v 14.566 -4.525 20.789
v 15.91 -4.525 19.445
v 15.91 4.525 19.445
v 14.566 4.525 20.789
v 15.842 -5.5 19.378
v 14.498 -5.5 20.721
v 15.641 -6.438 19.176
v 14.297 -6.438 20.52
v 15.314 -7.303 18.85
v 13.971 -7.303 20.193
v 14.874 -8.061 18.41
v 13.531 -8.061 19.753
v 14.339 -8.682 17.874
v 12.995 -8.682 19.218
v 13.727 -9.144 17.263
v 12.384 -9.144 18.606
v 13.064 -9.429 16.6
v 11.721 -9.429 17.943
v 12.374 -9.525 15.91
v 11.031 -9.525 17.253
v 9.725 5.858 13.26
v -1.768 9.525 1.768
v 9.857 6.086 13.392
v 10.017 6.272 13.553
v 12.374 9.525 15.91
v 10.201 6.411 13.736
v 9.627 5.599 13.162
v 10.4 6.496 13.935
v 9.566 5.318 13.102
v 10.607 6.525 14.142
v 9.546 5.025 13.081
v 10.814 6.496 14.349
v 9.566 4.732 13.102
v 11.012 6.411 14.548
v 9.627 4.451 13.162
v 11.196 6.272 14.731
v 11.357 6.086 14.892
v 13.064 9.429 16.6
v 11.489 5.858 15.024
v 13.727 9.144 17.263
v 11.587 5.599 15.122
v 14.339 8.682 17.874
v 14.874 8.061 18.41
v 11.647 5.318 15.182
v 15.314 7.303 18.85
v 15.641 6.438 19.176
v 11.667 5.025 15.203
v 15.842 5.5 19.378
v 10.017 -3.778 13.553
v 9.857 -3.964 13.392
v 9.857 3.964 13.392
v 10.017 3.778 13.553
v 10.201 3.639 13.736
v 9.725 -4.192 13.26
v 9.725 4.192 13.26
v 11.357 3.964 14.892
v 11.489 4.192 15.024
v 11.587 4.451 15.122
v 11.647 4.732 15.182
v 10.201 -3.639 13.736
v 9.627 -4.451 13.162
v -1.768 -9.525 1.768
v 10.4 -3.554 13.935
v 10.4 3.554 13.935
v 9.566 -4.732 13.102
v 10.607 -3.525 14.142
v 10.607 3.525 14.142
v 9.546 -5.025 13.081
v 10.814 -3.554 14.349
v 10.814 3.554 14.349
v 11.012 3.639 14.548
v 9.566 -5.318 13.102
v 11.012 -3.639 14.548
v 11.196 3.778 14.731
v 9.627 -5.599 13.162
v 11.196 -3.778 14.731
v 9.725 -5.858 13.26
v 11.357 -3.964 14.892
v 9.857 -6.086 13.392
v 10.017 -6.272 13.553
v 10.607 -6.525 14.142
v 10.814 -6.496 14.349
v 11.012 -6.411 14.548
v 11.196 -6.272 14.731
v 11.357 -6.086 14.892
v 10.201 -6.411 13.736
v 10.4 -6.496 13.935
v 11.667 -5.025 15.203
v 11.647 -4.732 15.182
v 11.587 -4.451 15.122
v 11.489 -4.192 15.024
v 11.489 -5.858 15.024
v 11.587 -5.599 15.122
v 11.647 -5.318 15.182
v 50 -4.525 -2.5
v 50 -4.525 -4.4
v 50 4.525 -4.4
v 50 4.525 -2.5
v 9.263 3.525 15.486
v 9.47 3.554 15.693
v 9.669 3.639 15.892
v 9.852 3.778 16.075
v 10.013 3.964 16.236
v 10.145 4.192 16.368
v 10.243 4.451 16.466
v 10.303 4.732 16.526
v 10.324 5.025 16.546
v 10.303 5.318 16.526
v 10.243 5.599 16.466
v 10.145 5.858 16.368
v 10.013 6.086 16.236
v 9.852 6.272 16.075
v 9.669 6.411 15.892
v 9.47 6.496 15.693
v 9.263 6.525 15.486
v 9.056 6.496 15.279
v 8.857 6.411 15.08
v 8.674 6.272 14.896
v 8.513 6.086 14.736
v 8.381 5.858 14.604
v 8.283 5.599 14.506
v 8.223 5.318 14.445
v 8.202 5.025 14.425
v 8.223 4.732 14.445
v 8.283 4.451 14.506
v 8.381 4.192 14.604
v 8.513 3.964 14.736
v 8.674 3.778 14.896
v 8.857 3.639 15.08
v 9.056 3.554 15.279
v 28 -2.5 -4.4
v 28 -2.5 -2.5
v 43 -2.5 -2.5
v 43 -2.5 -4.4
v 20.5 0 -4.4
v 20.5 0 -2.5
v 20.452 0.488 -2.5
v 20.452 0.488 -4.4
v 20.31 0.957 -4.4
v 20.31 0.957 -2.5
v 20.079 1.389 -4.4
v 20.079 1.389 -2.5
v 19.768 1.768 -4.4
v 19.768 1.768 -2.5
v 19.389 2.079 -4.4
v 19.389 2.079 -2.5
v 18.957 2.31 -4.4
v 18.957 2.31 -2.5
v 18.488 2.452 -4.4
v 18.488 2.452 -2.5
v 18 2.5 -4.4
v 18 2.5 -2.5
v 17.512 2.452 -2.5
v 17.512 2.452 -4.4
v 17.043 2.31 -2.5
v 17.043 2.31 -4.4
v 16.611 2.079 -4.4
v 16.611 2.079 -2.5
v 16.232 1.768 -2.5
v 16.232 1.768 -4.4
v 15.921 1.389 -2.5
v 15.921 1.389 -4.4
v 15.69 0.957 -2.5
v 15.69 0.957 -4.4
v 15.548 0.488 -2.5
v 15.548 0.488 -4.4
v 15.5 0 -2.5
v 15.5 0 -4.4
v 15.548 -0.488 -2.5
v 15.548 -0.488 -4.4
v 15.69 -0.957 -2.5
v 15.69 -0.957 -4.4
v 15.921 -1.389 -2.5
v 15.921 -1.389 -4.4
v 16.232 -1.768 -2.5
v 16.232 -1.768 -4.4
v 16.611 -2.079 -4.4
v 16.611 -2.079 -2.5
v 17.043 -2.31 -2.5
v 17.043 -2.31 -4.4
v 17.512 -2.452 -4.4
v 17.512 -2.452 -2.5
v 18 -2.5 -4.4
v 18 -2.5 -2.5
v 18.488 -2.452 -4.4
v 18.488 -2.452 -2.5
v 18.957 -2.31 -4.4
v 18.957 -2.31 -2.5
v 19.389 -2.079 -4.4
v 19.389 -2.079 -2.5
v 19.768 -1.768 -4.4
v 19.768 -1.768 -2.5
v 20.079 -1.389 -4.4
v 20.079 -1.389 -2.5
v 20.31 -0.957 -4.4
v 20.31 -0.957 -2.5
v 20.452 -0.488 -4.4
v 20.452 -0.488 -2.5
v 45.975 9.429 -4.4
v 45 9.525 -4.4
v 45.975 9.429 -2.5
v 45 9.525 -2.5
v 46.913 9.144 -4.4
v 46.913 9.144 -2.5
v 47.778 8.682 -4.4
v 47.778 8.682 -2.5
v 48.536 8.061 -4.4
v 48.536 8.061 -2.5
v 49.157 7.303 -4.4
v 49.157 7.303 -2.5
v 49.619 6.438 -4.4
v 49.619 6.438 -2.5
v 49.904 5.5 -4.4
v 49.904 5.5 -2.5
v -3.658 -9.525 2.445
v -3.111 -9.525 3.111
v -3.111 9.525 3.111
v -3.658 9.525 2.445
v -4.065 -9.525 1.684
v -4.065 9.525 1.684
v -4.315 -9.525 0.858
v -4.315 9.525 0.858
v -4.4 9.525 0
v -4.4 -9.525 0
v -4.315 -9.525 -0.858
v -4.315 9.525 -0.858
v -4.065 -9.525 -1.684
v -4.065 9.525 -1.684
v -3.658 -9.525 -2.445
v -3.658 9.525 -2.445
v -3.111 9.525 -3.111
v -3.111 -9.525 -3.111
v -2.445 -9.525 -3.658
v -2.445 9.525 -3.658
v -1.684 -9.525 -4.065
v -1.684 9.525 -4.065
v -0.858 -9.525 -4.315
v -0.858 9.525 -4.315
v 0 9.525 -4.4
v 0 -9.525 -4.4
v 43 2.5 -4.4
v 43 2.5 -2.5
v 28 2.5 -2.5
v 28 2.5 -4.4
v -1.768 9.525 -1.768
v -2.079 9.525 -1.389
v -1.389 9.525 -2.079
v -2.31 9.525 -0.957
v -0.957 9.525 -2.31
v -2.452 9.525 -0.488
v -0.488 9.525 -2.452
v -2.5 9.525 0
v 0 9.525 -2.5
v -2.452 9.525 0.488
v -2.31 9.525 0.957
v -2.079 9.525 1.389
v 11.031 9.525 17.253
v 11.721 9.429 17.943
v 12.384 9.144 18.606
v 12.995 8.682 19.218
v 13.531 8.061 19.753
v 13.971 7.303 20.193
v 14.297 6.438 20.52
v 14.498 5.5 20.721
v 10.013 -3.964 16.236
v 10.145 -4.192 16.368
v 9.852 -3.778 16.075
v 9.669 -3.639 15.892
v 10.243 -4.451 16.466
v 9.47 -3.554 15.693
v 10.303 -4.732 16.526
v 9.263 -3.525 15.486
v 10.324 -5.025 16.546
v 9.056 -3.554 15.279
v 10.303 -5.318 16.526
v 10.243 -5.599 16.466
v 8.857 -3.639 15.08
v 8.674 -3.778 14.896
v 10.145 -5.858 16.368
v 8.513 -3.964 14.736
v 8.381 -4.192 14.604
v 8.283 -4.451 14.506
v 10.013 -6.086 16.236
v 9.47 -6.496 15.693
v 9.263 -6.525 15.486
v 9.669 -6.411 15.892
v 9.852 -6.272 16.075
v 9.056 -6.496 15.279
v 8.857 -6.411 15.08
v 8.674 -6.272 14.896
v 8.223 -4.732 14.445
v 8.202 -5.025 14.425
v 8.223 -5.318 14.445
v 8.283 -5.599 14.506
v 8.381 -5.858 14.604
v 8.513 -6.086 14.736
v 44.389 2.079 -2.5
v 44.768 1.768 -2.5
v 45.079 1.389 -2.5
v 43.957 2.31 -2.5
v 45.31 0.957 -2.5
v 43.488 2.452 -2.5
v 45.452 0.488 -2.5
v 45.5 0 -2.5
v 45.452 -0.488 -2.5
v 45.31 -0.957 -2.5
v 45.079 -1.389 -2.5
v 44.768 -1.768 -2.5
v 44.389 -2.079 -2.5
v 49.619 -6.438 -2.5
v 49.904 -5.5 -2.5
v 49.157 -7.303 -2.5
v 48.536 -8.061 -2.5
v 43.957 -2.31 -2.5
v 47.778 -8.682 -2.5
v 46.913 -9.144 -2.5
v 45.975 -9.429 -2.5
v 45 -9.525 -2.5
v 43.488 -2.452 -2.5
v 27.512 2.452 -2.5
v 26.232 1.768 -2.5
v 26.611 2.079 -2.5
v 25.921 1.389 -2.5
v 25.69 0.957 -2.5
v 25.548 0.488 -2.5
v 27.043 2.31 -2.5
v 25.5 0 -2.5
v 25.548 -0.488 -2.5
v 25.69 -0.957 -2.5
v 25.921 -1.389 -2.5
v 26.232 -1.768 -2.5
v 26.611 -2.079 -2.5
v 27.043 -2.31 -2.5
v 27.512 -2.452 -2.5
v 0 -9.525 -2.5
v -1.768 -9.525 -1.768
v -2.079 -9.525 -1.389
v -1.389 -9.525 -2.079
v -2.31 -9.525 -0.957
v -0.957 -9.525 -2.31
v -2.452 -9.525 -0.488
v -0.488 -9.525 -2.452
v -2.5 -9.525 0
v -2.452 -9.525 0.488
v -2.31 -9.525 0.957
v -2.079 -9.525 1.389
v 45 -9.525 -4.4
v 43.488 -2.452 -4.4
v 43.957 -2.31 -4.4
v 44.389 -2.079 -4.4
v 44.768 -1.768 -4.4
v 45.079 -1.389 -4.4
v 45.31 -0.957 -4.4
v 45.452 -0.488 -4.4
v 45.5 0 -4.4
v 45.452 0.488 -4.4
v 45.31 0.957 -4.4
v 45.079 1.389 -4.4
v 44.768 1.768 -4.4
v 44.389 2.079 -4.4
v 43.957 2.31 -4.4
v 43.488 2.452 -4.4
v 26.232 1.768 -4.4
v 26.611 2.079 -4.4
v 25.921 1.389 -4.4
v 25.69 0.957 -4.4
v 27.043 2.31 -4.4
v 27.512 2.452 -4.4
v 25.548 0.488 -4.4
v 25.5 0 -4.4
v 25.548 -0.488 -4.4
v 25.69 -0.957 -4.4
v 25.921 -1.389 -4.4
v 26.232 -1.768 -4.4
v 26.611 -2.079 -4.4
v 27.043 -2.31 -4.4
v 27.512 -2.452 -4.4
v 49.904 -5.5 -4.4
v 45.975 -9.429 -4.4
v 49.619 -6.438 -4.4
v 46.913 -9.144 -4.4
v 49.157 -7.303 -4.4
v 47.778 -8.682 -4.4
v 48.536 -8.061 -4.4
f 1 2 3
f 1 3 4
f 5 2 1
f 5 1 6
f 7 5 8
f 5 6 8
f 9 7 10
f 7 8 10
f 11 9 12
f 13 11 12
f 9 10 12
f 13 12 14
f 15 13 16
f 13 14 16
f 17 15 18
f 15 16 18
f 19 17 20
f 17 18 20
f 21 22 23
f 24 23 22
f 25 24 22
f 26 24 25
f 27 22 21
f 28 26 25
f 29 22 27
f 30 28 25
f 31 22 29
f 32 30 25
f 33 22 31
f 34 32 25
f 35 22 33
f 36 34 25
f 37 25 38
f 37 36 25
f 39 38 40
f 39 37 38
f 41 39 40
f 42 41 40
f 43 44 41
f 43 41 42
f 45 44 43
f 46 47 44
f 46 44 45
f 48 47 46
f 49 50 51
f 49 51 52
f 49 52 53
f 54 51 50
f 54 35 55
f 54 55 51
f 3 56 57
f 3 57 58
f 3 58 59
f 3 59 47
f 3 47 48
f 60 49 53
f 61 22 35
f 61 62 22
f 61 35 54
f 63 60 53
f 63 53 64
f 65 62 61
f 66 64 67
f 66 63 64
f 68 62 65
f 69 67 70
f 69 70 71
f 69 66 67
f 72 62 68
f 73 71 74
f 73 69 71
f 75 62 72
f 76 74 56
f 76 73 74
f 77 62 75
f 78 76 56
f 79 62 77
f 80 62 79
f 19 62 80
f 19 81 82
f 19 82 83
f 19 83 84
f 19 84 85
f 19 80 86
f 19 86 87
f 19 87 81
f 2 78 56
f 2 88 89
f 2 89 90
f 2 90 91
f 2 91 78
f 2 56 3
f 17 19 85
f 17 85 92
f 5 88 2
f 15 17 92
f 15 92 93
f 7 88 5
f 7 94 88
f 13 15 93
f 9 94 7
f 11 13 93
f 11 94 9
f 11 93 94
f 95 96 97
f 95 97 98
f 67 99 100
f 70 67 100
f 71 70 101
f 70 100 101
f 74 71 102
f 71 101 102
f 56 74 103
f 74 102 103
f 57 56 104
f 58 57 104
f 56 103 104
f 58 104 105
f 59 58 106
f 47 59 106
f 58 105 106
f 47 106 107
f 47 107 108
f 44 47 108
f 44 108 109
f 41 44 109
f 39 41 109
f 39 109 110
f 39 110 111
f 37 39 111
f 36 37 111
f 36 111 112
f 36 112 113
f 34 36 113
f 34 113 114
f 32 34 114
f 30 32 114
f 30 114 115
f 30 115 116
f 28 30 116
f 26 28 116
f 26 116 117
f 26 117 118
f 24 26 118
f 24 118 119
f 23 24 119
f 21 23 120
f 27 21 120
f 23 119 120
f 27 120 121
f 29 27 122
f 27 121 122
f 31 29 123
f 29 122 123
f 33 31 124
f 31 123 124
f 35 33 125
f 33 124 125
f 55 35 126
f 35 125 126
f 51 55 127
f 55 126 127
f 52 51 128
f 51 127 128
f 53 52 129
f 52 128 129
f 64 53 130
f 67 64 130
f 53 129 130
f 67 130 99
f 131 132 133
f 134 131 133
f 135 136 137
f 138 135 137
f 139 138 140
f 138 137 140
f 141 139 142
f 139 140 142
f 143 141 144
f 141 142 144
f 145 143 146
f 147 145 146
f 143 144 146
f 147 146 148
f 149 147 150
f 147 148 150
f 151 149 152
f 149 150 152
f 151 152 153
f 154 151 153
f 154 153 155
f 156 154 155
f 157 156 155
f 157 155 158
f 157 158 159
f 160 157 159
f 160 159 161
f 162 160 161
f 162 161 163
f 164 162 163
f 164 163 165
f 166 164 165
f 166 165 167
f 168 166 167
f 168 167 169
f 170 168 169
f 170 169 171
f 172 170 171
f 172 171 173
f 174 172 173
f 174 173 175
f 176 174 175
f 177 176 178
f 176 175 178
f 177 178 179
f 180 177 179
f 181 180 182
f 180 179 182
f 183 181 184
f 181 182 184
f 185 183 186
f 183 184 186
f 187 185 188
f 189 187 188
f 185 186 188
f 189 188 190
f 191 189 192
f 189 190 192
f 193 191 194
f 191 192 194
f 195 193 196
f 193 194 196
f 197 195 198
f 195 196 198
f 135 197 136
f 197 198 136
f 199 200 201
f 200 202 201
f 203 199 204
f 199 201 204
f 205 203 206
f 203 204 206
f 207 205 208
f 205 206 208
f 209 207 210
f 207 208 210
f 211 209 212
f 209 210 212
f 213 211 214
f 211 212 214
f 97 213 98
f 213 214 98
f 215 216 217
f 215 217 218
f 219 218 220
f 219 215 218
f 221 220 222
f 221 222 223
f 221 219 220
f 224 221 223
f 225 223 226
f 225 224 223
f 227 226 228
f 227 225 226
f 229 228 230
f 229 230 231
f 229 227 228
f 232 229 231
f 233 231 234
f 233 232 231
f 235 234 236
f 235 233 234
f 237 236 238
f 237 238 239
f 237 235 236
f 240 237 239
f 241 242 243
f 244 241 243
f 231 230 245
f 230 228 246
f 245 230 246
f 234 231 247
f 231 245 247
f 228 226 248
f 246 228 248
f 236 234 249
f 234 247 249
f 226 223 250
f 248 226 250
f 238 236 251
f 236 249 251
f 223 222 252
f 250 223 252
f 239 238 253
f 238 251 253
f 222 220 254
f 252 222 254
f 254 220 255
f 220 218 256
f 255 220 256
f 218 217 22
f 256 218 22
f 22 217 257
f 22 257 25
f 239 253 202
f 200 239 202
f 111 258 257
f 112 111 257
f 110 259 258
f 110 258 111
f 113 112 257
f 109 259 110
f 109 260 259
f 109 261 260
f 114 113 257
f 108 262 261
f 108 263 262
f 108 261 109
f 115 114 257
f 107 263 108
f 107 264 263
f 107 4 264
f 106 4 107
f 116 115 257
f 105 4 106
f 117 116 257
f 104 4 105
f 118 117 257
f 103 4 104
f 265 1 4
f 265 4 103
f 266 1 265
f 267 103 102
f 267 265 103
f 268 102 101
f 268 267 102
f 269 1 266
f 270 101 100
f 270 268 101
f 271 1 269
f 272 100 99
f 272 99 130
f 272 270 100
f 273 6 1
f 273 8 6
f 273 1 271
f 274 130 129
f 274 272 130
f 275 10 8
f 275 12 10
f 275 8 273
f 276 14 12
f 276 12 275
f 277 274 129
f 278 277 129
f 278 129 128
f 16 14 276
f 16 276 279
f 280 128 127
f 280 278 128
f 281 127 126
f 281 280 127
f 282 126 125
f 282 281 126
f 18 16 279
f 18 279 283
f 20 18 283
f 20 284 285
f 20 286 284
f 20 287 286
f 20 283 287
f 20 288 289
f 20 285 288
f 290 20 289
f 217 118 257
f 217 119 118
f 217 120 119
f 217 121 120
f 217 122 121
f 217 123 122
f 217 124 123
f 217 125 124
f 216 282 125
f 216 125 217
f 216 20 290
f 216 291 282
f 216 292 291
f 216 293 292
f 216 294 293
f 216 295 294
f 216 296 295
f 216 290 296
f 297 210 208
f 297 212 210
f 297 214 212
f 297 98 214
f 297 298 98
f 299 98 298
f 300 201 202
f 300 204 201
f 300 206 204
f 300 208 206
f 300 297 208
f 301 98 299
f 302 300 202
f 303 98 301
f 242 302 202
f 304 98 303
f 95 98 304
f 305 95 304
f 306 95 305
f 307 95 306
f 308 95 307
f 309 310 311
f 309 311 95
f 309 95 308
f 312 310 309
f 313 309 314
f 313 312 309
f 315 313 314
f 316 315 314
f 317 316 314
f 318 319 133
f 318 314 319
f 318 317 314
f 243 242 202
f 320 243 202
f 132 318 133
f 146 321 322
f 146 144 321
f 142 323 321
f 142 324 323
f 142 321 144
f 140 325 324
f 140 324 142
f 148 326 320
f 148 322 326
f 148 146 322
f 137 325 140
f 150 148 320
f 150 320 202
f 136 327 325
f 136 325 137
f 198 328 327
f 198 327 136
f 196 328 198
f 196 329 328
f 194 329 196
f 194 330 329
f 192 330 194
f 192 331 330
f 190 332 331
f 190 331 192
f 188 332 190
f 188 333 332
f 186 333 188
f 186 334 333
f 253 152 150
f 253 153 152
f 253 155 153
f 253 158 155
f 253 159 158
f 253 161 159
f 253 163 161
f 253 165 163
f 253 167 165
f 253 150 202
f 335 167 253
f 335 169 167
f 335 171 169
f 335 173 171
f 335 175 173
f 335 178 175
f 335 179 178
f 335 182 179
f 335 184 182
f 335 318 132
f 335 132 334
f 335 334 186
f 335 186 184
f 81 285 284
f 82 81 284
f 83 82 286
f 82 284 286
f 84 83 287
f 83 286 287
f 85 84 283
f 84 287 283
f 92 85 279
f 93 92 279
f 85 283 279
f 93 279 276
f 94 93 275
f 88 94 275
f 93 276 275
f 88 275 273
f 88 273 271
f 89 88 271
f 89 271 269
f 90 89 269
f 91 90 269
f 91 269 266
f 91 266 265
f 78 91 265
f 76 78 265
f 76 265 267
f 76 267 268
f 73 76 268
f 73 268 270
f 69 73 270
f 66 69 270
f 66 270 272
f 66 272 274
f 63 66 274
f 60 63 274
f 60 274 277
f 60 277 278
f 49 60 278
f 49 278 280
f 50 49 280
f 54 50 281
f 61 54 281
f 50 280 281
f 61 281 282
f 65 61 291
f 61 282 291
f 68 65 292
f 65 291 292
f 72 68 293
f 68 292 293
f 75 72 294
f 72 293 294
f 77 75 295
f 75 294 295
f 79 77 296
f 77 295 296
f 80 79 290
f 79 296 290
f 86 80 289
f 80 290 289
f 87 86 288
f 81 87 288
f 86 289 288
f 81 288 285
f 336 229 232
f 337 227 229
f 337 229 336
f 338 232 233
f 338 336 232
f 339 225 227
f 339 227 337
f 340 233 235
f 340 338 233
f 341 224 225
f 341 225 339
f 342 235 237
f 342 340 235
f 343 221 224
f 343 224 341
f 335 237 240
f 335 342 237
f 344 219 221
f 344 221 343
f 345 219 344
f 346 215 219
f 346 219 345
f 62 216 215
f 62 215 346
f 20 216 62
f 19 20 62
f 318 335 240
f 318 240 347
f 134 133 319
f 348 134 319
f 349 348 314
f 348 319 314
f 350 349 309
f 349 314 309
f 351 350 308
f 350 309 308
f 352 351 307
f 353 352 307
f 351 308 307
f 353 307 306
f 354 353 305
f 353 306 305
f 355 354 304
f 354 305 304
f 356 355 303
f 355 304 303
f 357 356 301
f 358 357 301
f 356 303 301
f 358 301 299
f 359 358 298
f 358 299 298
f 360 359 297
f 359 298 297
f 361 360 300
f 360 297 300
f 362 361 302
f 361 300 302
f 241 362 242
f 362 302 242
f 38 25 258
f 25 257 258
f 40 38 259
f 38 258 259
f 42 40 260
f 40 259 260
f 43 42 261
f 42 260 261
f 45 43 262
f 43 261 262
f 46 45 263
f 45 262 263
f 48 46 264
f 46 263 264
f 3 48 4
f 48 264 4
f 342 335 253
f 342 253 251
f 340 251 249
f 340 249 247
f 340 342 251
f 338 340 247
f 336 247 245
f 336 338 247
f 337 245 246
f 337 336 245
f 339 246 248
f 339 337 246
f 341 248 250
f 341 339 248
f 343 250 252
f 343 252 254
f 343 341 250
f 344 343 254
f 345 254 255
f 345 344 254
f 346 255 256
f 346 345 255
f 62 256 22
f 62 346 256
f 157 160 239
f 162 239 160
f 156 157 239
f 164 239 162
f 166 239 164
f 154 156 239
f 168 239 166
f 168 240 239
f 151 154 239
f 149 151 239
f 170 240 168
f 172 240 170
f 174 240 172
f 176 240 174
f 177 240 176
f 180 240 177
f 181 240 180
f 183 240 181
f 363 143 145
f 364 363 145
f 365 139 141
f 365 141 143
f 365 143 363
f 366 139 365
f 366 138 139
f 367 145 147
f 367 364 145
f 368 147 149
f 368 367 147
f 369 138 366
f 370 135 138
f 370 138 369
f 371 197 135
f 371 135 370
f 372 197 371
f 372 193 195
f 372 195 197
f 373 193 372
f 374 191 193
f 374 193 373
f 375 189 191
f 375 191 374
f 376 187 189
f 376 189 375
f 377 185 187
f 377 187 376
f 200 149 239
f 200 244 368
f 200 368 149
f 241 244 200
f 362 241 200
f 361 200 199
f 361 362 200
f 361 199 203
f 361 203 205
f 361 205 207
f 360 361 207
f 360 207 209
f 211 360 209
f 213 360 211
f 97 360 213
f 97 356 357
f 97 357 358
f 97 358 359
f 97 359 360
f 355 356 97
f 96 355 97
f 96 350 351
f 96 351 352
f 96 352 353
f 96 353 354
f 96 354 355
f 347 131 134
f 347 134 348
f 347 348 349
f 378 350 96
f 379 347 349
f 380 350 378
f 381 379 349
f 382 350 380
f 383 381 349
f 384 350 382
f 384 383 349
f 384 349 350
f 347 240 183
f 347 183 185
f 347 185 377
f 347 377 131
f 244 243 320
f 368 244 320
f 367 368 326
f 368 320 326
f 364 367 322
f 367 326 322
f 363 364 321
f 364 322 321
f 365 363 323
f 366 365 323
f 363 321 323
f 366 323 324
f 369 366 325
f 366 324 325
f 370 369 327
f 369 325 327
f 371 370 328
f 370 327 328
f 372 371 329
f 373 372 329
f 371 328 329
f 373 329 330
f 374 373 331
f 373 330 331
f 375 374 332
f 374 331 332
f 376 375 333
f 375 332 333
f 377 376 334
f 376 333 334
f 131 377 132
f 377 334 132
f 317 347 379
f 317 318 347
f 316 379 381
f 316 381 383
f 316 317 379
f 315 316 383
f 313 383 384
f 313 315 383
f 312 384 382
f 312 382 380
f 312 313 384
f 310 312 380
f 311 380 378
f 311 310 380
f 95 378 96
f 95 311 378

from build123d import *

# Parameters (mm, degrees)
F1_DEPTH = 9.525
F2_R     = 2.5
F3_DEPTH = 1.901
F4_R     = 1.5
F5_DEPTH = 10
F6_R     = 5


with BuildPart() as f1:
    # F0 (on Front) → F1 (new body, symmetric)
    with BuildSketch(Plane.XZ):
        with BuildLine():
            Line((14.5663996924, 20.7889393669), (-3.1112698372, 3.1112698372))
            ThreePointArc((-3.1112698372, 3.1112698372), (-4.065069943, -1.6838071024), (0, -4.4))
            Line((0, -4.4), (50, -4.4))
            Line((50, -4.4), (50, -2.5))
            Line((50, -2.5), (0, -2.5))
            ThreePointArc((0, -2.5), (-2.3096988313, -0.9567085809), (-1.767766953, 1.767766953))
            Line((-1.767766953, 1.767766953), (15.9099025767, 19.4454364826))
            Line((15.9099025767, 19.4454364826), (14.5663996924, 20.7889393669))
        make_face()
    extrude(amount=F1_DEPTH, both=True)

    # F2 (on face) → F3 (cut, through all)
    with BuildSketch(Plane.XY.offset(-2.5)):
        with BuildLine():
            Line((43, 2.5), (28, 2.5))
            ThreePointArc((28, 2.5), (25.5, 0), (28, -2.5))
            Line((28, -2.5), (43, -2.5))
            ThreePointArc((43, -2.5), (45.5, 0), (43, 2.5))
        make_face()
        with Locations((18, 0)):
            Circle(F2_R)
    extrude(amount=-F3_DEPTH, mode=Mode.SUBTRACT)

    # F4 (on face) → F5 (cut)
    with BuildSketch(Plane(origin=(-3.1112698372, 0, 3.1112698372), x_dir=(0, -1, 0), z_dir=(-0.7071067812, 0, 0.7071067812))):
        with Locations((-5.025, 17.5)):
            Circle(F4_R)
        with Locations((5.025, 17.5)):
            Circle(F4_R)
    extrude(amount=-F5_DEPTH, mode=Mode.SUBTRACT)

    # F6
    f6_edges = [f1.edges().sort_by_distance(p)[0] for p in [
        (15.238151, 9.525, 20.117188),
        (50, -9.525, -3.45),
        (15.238151, -9.525, 20.117188),
        (50, 9.525, -3.45),
    ]]
    fillet(f6_edges, radius=F6_R)


solid = f1.part
